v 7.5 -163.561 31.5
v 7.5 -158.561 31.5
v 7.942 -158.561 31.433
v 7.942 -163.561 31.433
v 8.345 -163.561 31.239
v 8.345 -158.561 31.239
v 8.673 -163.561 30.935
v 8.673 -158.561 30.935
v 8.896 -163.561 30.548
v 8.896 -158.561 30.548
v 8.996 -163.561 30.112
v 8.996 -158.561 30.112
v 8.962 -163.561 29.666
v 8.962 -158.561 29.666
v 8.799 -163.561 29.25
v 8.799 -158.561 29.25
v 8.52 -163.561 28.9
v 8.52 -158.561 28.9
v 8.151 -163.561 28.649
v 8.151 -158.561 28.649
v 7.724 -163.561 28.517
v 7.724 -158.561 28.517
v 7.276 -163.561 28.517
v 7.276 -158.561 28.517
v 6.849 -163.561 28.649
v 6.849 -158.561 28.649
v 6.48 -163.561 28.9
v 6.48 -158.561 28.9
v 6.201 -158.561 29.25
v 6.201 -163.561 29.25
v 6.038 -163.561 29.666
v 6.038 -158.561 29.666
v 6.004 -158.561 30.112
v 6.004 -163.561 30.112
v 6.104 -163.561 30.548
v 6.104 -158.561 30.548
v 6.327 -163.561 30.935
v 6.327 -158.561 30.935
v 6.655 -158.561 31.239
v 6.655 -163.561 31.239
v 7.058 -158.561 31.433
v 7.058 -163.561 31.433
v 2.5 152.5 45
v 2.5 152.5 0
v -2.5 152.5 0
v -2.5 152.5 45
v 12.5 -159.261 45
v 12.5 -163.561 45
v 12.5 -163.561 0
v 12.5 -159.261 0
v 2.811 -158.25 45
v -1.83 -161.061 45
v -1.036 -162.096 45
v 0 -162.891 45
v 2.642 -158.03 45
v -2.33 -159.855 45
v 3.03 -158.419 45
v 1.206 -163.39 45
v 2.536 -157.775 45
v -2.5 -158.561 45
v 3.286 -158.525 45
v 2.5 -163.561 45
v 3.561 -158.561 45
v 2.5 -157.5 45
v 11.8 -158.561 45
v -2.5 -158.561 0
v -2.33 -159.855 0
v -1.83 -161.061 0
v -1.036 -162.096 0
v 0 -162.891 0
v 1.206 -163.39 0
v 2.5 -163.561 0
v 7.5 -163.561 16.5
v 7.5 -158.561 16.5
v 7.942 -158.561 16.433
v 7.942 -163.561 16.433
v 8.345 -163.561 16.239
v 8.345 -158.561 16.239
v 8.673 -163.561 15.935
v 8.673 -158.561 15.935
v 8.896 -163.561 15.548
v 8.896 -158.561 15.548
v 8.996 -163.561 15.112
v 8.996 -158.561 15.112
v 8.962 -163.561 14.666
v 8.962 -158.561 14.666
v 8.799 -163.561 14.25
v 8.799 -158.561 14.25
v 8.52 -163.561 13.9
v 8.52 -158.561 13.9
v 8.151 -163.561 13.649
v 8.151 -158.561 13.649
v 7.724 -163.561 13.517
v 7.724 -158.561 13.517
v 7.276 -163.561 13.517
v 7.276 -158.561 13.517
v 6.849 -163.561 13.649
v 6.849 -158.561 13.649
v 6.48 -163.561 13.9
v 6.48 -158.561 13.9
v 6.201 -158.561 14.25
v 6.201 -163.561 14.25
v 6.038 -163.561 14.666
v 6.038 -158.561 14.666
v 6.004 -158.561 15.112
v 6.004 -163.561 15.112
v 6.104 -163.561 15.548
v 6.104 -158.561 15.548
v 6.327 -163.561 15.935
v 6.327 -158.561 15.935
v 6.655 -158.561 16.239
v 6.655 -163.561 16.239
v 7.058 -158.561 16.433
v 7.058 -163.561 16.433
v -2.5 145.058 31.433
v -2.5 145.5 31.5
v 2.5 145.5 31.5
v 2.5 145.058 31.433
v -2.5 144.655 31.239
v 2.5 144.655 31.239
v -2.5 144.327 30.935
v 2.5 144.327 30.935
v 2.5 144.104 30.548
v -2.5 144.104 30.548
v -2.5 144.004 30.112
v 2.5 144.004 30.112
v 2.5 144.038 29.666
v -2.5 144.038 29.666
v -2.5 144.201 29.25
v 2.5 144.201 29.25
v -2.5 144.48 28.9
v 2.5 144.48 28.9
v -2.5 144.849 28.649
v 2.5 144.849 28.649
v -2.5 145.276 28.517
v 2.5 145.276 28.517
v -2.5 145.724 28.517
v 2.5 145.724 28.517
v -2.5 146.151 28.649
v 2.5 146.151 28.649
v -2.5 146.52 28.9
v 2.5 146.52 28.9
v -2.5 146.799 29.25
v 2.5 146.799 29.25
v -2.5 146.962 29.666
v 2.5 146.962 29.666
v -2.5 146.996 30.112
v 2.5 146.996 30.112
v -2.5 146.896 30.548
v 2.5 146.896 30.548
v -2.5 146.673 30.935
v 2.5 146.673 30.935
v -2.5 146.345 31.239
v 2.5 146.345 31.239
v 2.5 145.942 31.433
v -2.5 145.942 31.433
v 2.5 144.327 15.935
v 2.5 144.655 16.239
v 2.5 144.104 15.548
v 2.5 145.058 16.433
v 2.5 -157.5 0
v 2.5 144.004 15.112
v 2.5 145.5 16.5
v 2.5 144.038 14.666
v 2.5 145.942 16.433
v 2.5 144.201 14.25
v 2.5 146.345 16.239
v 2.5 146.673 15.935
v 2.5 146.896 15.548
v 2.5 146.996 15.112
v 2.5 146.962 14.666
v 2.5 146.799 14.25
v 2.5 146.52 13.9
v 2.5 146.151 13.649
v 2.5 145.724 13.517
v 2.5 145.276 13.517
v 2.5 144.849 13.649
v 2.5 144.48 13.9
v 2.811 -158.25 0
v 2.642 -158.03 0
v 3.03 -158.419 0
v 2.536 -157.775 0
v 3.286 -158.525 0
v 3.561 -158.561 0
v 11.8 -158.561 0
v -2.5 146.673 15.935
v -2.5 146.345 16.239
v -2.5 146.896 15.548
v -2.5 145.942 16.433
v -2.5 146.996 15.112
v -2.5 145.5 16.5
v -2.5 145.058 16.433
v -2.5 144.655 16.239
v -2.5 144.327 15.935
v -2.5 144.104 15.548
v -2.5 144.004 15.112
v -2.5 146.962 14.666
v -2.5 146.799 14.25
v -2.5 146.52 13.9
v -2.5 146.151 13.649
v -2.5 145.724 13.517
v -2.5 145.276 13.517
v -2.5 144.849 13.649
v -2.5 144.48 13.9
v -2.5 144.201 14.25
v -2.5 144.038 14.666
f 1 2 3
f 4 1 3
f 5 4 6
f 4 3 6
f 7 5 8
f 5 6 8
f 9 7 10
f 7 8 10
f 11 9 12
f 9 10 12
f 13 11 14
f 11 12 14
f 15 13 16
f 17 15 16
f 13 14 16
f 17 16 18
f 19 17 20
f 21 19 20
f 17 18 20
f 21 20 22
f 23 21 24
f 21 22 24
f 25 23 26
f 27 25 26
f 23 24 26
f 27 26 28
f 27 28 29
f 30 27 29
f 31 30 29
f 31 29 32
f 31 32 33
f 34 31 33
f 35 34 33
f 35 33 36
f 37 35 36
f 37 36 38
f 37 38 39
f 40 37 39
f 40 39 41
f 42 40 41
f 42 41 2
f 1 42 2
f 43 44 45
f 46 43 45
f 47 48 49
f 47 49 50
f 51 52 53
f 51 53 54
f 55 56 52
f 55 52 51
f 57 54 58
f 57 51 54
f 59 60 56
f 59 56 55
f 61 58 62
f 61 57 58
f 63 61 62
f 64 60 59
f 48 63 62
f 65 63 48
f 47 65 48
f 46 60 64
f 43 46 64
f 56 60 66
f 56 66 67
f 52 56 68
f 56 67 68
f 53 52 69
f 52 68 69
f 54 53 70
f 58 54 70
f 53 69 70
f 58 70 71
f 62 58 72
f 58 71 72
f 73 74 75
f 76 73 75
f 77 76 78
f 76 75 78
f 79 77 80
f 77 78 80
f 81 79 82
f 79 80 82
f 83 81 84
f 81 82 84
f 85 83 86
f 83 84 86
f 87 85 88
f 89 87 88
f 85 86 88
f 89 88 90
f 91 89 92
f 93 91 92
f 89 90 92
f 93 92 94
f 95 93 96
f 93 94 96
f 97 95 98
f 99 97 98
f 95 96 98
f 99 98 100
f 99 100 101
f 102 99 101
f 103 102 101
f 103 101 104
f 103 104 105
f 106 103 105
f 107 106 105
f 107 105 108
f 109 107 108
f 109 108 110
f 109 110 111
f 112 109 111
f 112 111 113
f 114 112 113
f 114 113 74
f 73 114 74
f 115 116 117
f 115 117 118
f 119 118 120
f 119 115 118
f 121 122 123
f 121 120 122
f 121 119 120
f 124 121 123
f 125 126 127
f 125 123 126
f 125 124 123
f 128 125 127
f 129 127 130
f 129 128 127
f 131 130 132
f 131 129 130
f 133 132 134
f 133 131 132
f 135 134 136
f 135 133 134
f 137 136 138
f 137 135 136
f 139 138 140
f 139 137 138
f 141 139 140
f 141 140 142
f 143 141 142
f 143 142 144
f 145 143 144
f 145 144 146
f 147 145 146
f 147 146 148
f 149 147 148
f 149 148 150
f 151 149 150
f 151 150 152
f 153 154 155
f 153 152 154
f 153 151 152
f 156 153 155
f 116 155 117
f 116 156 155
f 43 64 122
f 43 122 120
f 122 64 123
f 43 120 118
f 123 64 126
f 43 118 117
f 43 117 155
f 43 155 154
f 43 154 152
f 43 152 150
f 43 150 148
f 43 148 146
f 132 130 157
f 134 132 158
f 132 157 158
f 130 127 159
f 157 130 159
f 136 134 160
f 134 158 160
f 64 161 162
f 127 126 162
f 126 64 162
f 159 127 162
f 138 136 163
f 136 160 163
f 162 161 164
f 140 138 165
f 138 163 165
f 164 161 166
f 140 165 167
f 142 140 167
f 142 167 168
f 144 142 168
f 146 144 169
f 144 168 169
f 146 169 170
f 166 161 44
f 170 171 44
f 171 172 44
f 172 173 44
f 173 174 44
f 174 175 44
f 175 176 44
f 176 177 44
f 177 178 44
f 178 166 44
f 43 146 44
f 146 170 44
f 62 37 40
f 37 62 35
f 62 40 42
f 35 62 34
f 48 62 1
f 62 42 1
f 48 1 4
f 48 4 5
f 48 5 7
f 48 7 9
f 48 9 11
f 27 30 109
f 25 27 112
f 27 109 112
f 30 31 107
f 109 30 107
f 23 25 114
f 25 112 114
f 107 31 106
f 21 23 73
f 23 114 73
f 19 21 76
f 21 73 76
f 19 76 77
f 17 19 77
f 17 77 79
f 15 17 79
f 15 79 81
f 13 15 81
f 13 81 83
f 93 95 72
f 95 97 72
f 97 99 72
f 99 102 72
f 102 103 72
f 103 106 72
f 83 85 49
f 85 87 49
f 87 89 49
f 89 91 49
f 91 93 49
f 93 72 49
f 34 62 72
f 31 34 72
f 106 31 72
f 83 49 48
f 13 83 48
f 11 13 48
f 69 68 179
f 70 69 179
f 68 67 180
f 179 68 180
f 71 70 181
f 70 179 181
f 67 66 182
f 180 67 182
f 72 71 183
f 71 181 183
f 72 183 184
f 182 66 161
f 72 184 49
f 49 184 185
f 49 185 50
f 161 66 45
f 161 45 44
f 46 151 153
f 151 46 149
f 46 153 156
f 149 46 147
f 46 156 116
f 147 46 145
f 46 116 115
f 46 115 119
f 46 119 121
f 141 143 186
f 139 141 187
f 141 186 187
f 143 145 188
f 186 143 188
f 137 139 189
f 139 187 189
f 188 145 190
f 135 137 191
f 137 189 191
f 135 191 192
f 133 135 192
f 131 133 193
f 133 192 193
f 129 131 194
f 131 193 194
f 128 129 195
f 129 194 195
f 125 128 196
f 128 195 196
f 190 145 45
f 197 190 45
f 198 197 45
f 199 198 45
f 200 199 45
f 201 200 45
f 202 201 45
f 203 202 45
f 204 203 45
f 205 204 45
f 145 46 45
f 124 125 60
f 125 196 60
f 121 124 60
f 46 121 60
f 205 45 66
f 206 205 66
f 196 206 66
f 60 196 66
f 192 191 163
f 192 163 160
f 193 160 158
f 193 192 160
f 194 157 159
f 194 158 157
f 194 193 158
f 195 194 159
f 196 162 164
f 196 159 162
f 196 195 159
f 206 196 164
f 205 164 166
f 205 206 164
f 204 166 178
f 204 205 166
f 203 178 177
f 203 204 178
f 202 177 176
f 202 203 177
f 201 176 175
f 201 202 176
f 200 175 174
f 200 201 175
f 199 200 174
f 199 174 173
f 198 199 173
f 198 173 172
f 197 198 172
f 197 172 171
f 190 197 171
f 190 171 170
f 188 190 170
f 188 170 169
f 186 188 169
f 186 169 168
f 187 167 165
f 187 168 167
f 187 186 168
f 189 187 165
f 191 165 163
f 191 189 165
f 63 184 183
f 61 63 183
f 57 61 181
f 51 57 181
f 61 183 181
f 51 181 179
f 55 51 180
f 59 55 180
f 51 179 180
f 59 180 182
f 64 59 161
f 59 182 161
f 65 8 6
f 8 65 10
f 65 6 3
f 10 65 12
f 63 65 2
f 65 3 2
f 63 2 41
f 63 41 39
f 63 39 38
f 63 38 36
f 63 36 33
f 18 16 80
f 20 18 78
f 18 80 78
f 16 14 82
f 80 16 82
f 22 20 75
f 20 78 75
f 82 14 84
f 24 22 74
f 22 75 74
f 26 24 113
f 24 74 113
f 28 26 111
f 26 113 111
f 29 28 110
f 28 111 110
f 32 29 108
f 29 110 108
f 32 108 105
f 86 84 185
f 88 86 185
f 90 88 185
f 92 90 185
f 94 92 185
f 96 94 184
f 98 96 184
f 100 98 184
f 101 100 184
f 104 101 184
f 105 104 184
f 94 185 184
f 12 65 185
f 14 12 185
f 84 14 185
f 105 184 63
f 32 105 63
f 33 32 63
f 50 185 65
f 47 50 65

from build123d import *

# Parameters (mm, degrees)
BOSS_EXTRUDE1_DEPTH     = 45
CUT_EXTRUDE1_START      = -158.56066
SKETCH2_R               = 1.5
CUT_EXTRUDE1_DEPTH      = 10
CUT_EXTRUDE2_DEPTH      = 10
CUT_EXTRUDE2_DEPTH_BACK = 10
SKETCH3_R               = 1.5
CHAMFER1_SIZE           = 0.7


with BuildPart() as part:
    # Sketch1 → Boss-Extrude1 (new body)
    with BuildSketch(Plane.XY):
        with BuildLine():
            Line((2.5, -163.560660172), (12.5, -163.560660172))
            Line((12.5, -163.560660172), (12.5, -158.560660172))
            Line((12.5, -158.560660172), (3.560660172, -158.560660172))
            ThreePointArc((3.560660172, -158.560660172), (2.810660172, -158.25), (2.5, -157.5))
            Line((2.5, -157.5), (2.5, 152.5))
            Line((2.5, 152.5), (-2.5, 152.5))
            Line((-2.5, 152.5), (-2.5, -158.560660172))
            ThreePointArc((-2.5, -158.560660172), (-1.035533906, -162.096194078), (2.5, -163.560660172))
        make_face()
    extrude(amount=BOSS_EXTRUDE1_DEPTH)

    # Sketch2 → Cut-Extrude1 (cut)
    with BuildSketch(Plane(origin=(0, 0, 0), x_dir=(1, 0, 0), z_dir=(0, 1, 0)).offset(CUT_EXTRUDE1_START)):
        with Locations(Location((7.5, -15, 0), (0, 0, 270))):
            Circle(SKETCH2_R)
        with Locations(Location((7.5, -30, 0), (0, 0, 270))):
            Circle(SKETCH2_R)
    extrude(amount=-CUT_EXTRUDE1_DEPTH, mode=Mode.SUBTRACT)

    # Sketch3 → Cut-Extrude2 (cut, two sides: drawn at the far end of the back side and taken through both)
    with BuildSketch(Plane(origin=(0, 0, 0), x_dir=(0, 0, -1), z_dir=(1, 0, 0)).offset(-CUT_EXTRUDE2_DEPTH_BACK)):
        with Locations(Location((-15, 145.5, 0), (0, 0, 180))):
            Circle(SKETCH3_R)
        with Locations(Location((-30, 145.5, 0), (0, 0, 180))):
            Circle(SKETCH3_R)
    extrude(amount=CUT_EXTRUDE2_DEPTH + CUT_EXTRUDE2_DEPTH_BACK, mode=Mode.SUBTRACT)

    # Chamfer1
    chamfer1_edges = [part.edges().sort_by_distance(p)[0] for p in [
        (12.5, -158.560660172, 22.5),
    ]]
    chamfer(chamfer1_edges, length=CHAMFER1_SIZE)


solid = part.part
